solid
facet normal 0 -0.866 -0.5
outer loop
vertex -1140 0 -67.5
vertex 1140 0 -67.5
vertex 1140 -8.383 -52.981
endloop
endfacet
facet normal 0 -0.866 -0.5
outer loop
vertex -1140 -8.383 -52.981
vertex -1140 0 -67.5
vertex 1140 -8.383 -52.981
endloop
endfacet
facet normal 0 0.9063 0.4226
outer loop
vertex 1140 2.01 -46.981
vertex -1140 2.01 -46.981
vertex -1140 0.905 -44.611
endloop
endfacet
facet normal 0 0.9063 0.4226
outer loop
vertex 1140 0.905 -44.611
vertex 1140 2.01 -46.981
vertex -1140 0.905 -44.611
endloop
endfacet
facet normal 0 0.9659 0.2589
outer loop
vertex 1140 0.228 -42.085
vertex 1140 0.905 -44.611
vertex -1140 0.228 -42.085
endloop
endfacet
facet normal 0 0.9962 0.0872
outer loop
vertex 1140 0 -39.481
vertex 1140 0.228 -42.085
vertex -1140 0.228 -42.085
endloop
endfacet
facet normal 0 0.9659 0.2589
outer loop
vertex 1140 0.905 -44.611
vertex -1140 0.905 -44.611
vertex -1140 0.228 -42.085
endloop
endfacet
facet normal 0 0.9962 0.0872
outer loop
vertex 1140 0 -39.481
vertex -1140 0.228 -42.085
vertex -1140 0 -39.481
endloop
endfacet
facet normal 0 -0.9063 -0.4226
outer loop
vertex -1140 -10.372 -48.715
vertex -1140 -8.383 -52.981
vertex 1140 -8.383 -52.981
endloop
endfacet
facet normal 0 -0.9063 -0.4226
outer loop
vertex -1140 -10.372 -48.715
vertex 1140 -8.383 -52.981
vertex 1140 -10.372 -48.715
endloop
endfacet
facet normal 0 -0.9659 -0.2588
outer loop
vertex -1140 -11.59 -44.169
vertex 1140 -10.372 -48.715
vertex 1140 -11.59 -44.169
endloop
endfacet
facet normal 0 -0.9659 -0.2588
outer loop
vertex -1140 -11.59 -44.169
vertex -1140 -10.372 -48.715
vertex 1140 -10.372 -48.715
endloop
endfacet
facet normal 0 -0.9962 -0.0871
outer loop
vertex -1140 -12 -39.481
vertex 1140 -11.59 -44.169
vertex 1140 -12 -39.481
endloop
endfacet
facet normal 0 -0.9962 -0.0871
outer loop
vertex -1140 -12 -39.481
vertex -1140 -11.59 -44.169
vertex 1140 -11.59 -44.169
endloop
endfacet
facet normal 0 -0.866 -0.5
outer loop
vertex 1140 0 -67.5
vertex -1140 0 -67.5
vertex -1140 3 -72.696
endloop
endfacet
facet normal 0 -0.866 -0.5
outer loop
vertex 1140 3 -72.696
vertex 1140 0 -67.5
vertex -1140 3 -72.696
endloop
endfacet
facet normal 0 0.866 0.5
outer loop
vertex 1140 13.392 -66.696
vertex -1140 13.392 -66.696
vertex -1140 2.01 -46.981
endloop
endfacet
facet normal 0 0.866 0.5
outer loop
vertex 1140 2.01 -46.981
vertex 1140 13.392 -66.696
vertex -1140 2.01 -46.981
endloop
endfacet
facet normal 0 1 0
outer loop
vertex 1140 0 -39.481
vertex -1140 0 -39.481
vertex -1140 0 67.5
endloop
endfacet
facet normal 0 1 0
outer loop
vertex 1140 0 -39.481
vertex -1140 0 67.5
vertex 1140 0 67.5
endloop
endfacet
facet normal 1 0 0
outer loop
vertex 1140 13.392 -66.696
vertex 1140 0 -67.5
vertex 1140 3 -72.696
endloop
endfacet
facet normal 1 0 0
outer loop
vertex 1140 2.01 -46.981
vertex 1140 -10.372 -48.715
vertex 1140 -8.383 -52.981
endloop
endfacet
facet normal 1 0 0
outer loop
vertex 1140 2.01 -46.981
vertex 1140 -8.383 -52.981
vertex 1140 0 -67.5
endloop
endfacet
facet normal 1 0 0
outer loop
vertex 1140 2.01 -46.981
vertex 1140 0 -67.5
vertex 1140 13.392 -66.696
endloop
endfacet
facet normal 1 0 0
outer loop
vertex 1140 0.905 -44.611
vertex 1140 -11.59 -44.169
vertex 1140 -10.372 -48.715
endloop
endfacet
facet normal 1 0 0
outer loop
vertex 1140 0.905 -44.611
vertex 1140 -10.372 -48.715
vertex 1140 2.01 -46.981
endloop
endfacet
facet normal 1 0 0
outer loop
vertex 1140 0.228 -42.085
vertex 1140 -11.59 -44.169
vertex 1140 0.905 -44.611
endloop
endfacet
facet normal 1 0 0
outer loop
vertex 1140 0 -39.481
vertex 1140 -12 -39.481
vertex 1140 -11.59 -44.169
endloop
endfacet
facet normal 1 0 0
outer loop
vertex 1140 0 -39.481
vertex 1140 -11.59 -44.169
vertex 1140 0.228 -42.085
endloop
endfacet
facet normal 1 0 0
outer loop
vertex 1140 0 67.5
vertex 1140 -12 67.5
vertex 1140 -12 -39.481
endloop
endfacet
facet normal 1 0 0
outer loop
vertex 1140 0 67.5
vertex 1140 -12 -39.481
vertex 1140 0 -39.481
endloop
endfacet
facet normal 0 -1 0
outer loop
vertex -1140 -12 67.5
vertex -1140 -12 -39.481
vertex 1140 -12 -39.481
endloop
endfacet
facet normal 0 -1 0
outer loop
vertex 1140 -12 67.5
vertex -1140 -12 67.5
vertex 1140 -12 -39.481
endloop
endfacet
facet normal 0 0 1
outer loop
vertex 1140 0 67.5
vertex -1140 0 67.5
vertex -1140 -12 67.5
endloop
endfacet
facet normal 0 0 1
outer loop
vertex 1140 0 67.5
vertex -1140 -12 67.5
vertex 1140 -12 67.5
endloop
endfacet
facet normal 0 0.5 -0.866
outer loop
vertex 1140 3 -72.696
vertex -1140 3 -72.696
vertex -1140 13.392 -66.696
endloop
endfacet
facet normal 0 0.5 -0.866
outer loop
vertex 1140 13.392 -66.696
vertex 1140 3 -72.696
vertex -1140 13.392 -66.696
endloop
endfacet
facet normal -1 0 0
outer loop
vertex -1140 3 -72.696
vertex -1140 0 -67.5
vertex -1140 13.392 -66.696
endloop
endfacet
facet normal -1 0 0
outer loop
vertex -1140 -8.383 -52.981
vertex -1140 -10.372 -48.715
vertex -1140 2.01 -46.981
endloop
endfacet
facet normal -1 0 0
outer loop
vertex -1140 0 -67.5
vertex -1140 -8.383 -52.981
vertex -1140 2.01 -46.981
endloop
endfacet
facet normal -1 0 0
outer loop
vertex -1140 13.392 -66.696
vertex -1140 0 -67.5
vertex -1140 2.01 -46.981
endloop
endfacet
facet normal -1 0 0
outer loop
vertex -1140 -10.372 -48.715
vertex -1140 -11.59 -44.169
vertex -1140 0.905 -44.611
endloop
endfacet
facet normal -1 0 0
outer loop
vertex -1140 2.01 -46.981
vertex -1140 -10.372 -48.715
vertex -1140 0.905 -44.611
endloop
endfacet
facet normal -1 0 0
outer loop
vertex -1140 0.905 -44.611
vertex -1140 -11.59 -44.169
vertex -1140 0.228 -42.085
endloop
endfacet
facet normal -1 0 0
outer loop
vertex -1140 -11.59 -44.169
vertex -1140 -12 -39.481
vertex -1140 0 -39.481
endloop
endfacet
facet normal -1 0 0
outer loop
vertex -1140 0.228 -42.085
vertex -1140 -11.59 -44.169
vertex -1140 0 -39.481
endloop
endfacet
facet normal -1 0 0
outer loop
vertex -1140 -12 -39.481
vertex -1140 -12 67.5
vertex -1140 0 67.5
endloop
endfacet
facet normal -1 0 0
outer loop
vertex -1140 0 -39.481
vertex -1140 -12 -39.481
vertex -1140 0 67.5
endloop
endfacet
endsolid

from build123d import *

# Parameters (mm, degrees)
SKETCH1_W            = 2280
SKETCH1_H            = 135
BASE_FLANGE1_DEPTH   = 12
EDGE_FLANGE1_START   = -1140
EDGE_FLANGE1_DEPTH   = 2280
EDGE_FLANGE1_2_DEPTH = 2280


# Read off the part's stored shape, not the designer's step: Edge-Flange1
# Sheet-metal steps are written as plain solids
with BuildPart() as part:
    # Sketch1 → Base-Flange1 (new body)
    with BuildSketch(Plane(origin=(0, 0, 0), x_dir=(1, 0, 0), z_dir=(0, 1, 0))):
        Rectangle(SKETCH1_W, SKETCH1_H)
    extrude(amount=-BASE_FLANGE1_DEPTH)

    # Edge-Flange1 outline → Edge-Flange1 (cut)
    with BuildSketch(Plane.YZ.offset(EDGE_FLANGE1_START)):
        with BuildLine():
            Line((0, -67.5), (-8.382685902, -52.980762114))
            ThreePointArc((-8.382685902, -52.980762114), (-11.07999731, -46.468876332), (-12, -39.480762114))
            Line((-12, -39.480762114), (-12, -67.5))
            Line((-12, -67.5), (0, -67.5))
        make_face()
    extrude(amount=EDGE_FLANGE1_DEPTH, mode=Mode.SUBTRACT)

    # Edge-Flange1 2 outline → Edge-Flange1 2 (add)
    with BuildSketch(Plane.YZ.offset(EDGE_FLANGE1_START)):
        with BuildLine():
            Line((0, -39.480762114), (0, -67.5))
            Line((0, -67.5), (3, -72.696152423))
            Line((3, -72.696152423), (13.392304845, -66.696152423))
            Line((13.392304845, -66.696152423), (2.009618943, -46.980762114))
            ThreePointArc((2.009618943, -46.980762114), (0.511112606, -43.36304779), (0, -39.480762114))
        make_face()
    extrude(amount=EDGE_FLANGE1_2_DEPTH)


solid = part.part
